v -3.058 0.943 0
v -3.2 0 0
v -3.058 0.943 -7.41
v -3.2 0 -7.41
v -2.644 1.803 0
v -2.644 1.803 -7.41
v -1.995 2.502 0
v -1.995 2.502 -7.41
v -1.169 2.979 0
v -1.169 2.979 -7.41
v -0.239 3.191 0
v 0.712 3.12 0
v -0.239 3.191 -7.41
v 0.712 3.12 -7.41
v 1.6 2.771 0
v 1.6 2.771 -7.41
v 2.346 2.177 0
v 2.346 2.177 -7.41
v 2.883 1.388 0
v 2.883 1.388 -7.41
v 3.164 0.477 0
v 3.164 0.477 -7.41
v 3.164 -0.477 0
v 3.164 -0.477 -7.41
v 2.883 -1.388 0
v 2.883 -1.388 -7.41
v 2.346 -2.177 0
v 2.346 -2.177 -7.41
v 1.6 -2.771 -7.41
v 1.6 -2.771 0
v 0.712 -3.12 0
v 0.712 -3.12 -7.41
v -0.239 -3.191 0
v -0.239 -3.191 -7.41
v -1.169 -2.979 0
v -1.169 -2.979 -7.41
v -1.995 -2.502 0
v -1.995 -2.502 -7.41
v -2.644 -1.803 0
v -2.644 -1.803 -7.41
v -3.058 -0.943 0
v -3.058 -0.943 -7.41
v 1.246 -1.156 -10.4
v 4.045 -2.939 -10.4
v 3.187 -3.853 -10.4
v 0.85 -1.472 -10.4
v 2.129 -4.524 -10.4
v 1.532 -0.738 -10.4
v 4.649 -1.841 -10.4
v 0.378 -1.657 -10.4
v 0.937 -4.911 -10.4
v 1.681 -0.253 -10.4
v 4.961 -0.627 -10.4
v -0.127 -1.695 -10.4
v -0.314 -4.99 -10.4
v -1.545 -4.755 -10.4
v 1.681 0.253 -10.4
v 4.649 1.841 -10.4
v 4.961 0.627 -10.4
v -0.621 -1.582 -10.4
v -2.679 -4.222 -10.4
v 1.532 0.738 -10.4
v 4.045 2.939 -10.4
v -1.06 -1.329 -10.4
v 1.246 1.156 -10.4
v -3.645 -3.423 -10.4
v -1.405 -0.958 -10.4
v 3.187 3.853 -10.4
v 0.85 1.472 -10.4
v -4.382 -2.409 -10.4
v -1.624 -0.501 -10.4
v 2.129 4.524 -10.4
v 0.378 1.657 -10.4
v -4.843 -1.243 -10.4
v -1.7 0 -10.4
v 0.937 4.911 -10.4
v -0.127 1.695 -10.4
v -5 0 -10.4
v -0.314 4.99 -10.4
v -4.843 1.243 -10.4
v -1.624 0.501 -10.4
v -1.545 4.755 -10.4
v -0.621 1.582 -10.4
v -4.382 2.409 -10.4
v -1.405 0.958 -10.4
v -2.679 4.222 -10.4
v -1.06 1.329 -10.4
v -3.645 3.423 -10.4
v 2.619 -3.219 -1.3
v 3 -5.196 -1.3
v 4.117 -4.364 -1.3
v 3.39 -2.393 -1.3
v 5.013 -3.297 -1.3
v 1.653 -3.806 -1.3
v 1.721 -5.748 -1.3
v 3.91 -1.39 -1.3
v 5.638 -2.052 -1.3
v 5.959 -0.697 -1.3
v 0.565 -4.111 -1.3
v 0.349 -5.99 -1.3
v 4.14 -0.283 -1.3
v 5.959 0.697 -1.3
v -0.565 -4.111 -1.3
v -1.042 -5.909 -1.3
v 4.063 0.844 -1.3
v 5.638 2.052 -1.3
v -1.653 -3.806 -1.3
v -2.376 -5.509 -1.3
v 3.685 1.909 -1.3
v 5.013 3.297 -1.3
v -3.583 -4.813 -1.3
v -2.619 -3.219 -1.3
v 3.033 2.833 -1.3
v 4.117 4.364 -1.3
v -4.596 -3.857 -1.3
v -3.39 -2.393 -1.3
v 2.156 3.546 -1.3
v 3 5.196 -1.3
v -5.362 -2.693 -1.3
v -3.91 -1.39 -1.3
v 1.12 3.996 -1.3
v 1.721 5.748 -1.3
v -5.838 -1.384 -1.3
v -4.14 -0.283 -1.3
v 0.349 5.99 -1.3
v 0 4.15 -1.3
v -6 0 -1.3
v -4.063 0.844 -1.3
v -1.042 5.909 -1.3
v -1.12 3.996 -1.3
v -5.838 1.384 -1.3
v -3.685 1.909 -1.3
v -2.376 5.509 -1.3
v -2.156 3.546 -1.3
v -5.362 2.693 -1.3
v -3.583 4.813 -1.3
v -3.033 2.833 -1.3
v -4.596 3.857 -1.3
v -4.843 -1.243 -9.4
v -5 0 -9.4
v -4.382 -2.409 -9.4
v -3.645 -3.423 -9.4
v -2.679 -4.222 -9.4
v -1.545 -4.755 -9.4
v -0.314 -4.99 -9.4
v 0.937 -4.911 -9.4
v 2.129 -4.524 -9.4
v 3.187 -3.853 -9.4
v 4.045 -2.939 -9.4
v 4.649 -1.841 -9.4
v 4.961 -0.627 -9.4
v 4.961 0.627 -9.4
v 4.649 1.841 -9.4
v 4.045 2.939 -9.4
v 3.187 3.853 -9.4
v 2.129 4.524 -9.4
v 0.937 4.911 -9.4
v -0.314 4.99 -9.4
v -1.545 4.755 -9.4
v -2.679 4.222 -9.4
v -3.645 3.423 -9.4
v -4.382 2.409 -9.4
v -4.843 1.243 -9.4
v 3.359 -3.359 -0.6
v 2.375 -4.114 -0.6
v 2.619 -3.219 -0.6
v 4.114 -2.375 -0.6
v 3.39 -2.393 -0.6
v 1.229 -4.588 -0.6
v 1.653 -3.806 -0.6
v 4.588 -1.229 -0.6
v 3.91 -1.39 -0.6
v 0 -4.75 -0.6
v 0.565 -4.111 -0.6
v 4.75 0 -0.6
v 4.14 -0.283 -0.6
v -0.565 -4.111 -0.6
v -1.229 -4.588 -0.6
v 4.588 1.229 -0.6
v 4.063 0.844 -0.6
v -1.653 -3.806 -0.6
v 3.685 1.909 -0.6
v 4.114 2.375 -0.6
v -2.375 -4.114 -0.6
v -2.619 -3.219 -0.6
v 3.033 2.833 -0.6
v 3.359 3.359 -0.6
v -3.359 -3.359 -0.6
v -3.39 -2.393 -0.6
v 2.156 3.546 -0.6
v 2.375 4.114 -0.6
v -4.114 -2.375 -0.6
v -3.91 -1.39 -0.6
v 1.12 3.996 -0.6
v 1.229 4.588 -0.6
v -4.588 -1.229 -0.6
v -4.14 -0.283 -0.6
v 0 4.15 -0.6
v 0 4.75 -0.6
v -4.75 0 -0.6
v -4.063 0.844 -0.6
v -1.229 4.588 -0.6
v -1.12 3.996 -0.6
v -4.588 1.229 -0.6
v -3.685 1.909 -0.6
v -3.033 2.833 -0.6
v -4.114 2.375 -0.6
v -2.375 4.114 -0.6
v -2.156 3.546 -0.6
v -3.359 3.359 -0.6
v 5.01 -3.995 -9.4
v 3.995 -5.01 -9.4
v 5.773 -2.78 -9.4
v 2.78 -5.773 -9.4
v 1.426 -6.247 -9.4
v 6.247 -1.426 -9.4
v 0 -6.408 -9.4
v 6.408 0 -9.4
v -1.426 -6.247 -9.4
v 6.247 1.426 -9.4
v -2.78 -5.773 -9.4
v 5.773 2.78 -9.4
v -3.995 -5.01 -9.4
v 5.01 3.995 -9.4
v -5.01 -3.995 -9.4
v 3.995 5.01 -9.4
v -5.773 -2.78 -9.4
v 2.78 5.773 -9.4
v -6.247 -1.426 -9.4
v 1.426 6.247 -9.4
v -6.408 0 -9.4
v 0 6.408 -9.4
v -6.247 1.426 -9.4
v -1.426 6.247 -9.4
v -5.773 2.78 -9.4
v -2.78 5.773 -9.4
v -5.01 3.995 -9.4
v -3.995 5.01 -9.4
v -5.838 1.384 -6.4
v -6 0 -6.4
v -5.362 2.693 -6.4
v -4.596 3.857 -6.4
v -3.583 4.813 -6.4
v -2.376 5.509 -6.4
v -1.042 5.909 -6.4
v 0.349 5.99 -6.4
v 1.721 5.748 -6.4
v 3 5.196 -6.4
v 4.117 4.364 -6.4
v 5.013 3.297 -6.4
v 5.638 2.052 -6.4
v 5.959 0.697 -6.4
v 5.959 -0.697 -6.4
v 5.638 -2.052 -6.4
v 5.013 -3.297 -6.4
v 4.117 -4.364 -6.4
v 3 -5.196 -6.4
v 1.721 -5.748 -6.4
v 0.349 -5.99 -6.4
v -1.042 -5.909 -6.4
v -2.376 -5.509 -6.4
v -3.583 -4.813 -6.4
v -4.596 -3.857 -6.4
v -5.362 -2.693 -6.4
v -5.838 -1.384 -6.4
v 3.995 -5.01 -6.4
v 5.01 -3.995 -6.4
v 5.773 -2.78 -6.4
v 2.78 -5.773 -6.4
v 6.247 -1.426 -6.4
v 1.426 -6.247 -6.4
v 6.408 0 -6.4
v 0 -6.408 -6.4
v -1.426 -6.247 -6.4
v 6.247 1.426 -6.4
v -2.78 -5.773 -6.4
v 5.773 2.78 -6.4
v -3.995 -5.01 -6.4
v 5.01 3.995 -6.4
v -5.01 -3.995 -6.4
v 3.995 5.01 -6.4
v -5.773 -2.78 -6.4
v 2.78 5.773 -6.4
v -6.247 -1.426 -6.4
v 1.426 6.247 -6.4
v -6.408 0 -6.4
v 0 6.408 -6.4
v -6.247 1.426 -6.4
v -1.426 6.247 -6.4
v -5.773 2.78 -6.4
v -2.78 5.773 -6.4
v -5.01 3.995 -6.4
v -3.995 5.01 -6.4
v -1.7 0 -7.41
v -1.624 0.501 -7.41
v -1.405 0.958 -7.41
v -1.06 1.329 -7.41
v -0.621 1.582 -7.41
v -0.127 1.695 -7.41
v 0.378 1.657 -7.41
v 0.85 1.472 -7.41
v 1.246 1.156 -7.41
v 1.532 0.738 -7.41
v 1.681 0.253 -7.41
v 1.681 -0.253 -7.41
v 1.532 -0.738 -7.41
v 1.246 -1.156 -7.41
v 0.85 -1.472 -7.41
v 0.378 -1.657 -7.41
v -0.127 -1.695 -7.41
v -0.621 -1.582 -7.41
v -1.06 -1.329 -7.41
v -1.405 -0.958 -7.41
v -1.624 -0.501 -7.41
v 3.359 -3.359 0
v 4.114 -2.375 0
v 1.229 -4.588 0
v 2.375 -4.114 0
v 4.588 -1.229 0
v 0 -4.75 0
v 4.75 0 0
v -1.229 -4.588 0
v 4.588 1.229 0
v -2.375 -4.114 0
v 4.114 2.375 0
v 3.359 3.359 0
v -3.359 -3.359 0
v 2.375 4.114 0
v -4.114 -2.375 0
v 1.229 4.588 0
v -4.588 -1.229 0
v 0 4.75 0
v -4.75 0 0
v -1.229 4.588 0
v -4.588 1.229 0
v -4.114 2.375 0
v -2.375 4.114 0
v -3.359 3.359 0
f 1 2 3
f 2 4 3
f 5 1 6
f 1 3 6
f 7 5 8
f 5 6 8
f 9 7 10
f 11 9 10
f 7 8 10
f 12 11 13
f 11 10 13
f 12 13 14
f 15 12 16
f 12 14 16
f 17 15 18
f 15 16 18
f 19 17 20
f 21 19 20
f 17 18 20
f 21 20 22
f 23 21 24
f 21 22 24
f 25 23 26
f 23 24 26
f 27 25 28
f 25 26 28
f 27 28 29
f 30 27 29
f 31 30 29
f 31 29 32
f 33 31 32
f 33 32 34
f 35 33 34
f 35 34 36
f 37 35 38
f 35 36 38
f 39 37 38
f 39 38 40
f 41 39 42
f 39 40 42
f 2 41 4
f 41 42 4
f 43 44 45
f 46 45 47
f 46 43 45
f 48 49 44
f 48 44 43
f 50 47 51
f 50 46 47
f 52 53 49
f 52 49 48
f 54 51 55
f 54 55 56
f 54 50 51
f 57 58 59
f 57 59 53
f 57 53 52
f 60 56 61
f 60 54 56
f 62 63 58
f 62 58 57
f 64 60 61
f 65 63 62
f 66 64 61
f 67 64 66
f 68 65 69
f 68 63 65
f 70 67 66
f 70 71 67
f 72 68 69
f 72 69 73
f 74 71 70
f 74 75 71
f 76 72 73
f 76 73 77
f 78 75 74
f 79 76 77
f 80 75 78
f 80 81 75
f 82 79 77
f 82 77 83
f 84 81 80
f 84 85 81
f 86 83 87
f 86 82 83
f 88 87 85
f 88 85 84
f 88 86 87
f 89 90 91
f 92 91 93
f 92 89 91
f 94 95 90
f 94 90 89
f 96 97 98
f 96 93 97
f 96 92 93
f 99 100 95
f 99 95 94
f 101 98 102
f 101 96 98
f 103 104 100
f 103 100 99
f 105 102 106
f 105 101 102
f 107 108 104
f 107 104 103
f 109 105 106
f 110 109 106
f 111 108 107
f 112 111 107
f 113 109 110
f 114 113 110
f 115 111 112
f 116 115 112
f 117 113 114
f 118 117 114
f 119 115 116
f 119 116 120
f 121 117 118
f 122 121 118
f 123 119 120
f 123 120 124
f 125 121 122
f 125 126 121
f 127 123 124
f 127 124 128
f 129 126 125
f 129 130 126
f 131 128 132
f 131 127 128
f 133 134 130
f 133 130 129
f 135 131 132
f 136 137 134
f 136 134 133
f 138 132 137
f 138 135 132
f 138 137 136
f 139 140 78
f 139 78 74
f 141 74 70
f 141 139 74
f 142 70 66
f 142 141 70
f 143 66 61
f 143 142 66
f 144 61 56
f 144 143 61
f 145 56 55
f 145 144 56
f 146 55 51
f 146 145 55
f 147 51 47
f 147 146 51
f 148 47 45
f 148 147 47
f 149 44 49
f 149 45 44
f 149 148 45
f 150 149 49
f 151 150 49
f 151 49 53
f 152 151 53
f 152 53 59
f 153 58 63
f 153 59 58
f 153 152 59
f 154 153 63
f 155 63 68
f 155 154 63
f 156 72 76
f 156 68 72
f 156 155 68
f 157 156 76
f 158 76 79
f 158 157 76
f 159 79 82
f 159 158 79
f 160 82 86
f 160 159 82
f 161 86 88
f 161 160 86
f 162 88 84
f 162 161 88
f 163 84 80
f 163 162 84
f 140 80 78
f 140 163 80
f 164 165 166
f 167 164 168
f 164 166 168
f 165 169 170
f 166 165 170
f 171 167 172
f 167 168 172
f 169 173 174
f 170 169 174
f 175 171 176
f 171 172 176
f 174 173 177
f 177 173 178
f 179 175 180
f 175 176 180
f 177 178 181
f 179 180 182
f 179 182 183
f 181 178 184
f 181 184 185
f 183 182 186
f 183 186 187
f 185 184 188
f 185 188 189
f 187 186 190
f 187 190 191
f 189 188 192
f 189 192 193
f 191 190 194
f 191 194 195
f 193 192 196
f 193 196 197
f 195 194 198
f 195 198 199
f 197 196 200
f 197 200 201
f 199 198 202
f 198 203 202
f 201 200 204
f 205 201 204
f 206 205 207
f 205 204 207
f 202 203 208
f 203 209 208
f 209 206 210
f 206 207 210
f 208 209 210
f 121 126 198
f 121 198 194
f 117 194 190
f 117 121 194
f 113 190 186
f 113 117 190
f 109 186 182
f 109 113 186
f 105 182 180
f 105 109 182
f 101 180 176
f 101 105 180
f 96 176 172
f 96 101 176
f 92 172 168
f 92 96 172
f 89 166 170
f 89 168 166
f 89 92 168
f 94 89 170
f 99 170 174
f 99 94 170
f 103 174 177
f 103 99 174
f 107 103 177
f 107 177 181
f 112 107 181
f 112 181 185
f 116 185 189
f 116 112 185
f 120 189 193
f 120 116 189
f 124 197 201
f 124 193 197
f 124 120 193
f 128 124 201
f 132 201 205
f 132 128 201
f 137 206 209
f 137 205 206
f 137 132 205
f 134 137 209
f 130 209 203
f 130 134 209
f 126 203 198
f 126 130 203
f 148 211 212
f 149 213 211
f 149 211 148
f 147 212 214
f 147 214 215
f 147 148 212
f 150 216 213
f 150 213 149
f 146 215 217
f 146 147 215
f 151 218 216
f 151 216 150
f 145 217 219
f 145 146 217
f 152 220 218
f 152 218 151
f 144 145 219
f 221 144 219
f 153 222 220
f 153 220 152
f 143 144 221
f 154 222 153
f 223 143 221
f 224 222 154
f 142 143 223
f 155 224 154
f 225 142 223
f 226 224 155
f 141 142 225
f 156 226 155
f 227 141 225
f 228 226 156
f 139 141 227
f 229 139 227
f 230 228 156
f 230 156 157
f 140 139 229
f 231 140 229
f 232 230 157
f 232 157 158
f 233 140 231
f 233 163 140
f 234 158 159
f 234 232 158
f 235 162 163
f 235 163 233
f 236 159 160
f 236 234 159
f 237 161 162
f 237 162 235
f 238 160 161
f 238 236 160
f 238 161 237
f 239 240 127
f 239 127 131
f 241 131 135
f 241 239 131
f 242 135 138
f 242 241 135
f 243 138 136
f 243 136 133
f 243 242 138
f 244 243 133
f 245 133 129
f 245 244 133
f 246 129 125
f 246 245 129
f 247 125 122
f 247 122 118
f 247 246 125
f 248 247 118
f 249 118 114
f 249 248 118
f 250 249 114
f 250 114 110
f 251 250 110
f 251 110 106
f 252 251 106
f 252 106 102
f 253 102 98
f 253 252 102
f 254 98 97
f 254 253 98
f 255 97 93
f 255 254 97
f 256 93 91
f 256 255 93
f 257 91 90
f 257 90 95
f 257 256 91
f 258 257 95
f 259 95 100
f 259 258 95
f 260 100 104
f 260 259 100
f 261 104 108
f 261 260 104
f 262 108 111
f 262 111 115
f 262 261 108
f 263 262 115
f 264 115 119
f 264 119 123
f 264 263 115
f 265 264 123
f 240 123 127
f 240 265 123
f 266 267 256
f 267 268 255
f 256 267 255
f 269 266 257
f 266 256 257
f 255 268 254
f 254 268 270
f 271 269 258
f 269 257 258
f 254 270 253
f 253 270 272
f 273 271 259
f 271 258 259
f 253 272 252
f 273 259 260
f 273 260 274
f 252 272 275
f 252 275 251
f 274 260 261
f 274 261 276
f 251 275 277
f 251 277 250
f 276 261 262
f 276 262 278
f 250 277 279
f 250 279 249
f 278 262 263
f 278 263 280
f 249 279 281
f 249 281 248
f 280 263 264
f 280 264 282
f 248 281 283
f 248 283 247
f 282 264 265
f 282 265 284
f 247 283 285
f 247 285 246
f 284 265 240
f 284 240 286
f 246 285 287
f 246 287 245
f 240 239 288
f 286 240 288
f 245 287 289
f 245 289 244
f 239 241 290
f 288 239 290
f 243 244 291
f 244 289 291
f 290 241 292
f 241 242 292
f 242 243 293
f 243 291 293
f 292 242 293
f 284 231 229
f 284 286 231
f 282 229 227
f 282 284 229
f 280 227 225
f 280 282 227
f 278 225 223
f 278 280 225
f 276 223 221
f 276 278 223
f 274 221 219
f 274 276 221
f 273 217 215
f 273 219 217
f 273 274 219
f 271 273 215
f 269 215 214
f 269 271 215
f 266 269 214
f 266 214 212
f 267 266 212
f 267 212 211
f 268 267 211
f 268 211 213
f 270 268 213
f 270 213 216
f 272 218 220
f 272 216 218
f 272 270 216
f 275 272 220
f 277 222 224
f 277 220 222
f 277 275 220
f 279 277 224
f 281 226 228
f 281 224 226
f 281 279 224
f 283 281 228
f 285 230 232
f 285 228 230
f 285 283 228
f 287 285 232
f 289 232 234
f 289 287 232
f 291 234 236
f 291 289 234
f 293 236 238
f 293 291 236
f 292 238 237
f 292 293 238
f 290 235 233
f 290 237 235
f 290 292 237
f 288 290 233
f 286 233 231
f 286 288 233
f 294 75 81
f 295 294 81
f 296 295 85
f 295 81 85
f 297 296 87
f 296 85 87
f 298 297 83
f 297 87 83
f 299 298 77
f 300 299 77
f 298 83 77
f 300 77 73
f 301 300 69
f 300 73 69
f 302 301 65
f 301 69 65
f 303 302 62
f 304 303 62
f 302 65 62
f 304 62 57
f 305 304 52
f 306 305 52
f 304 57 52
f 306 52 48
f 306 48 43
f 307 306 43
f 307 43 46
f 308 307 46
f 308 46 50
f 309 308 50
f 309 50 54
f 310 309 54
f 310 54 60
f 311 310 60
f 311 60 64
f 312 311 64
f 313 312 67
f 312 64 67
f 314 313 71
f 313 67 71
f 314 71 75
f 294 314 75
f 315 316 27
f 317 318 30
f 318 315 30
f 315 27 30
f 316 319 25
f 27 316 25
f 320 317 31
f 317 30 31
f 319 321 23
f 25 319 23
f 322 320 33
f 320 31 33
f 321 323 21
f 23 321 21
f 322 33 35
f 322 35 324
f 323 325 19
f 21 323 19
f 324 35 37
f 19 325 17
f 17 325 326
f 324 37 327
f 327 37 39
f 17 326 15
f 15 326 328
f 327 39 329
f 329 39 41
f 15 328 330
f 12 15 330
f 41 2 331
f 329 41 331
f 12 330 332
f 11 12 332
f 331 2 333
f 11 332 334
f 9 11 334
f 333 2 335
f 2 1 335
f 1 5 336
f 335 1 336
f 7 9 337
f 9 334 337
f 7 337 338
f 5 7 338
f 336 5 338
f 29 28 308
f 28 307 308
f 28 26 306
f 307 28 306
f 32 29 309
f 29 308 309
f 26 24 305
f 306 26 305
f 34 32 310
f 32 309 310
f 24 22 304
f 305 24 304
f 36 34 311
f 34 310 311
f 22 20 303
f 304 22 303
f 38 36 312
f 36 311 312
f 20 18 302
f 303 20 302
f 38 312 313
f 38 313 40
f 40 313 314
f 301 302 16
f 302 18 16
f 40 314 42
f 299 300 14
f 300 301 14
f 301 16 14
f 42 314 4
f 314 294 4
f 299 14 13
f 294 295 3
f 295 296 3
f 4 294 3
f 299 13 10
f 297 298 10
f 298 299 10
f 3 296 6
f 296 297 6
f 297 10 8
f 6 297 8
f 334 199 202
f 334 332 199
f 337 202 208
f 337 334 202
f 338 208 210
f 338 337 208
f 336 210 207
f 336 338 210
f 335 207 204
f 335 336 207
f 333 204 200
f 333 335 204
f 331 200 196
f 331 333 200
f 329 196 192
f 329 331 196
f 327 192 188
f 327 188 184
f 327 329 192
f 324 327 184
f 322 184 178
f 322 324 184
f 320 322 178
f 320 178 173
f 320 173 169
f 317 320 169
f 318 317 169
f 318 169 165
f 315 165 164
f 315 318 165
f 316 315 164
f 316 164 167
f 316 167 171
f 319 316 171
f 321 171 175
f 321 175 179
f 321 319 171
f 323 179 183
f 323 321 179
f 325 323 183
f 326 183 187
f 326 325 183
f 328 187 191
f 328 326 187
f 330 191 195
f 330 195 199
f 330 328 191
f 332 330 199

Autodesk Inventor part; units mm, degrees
ref_plane "YZ Plane" through (0, 0, 0) normal (1, 0, 0) x (0, 1, 0)
ref_plane "XZ Plane" through (0, 0, 0) normal (0, 1, 0) x (-1, 0, 0)
ref_plane "XY Plane" through (0, 0, 0) normal (0, 0, 1) x (1, 0, 0)
sketch "Sketch1" plane through (0, 0, 0) normal (0, 1, 0) x (-1, 0, 0)
  line L0 (1.7, -10.4) -> (5, -10.4)
  line L1 (5, -10.4) -> (5, -9.4)
  line L2 (3.2, -7.41) -> (1.7, -7.41)
  line L3 (1.7, -7.41) -> (1.7, -10.4)
  line L4 (5, -9.4) -> (6.408, -9.4)
  line L5 (6.408, -9.4) -> (6.408, -6.4)
  line L6 (6.408, -6.4) -> (6, -6.4)
  line L7 (3.2, 0) -> (3.2, -7.41)
  line L8 (3.2, 0) -> (6, 0)
  line L9 (6, 0) -> (6, -6.4)
  line L10 (0, 0) -> (0, -11.6607)
  dimension "d0" = 5
  dimension "d1" = 10.4
  dimension "d2" = 1
  dimension "d3" = 0
  dimension "d4" = 3
  dimension "d5" = 7.41
  dimension "d6" = 1.7
  dimension "d8" = 6
  dimension "d9" = 6.408
  dimension "d10" = 3.2
revolve "Revolution1" add sketch "Sketch1" angle 360 about axis through (0, 0, 0) along (0, 0, -1)
sketch "Sketch3" plane through (0, 0, 0) normal (1, 0, 0) x (0, 1, 0)
  line L0 (1.7, -10.4) -> (1.7, -7.41) construction
  line L1 (1.7, -7.41) -> (3.2, -7.41) construction
  line L2 (3.2, -7.41) -> (3.2, 0) construction
  line L3 (3.2, 0) -> (6, 0) construction
  line L4 (6, 0) -> (6, -6.4) construction
  line L5 (6, -6.4) -> (6.408, -6.4) construction
  line L6 (6.408, -6.4) -> (6.408, -9.4) construction
  line L7 (6.408, -9.4) -> (5, -9.4) construction
  line L8 (5, -9.4) -> (5, -10.4) construction
  line L9 (5, -10.4) -> (1.7, -10.4) construction
  line L10 (-1.7, -7.41) -> (-1.7, -10.4) construction
  line L11 (-1.7, -10.4) -> (-5, -10.4) construction
  line L12 (-5, -10.4) -> (-5, -9.4) construction
  line L13 (-5, -9.4) -> (-6.408, -9.4) construction
  line L14 (-6.408, -9.4) -> (-6.408, -6.4) construction
  line L15 (-6.408, -6.4) -> (-6, -6.4) construction
  line L16 (-6, -6.4) -> (-6, 0) construction
  line L17 (-6, 0) -> (-3.2, 0) construction
  line L18 (-3.2, 0) -> (-3.2, -7.41) construction
  line L19 (-3.2, -7.41) -> (-1.7, -7.41) construction
  line L20 (6, 0) -> (4.15, 0)
  line L21 (4.15, -0.6) -> (4.15, -1.3)
  line L22 (4.15, -1.3) -> (6, -1.3)
  line L23 (6, -1.3) -> (6, 0)
  line L24 (-6, 0) -> (6, 0) projected
  line L25 (4.15, -0.6) -> (4.75, -0.6)
  line L26 (4.75, -0.6) -> (4.75, 0)
  line L27 (4.75, 0) -> (4.15, 0)
  line L28 (0, -12.48) -> (0, 2.08) projected
  point P0 (0, 0)
  dimension "d13" = 0.6
  dimension "d14" = 1.3
  dimension "d15" = 4.15
  dimension "d16" = 4.75
revolve "Revolution2" cut sketch "Sketch3" angle 360 about axis through (0, 0, -10) along (0, 0, 1)
properties part number "500-107" material "Steel"
